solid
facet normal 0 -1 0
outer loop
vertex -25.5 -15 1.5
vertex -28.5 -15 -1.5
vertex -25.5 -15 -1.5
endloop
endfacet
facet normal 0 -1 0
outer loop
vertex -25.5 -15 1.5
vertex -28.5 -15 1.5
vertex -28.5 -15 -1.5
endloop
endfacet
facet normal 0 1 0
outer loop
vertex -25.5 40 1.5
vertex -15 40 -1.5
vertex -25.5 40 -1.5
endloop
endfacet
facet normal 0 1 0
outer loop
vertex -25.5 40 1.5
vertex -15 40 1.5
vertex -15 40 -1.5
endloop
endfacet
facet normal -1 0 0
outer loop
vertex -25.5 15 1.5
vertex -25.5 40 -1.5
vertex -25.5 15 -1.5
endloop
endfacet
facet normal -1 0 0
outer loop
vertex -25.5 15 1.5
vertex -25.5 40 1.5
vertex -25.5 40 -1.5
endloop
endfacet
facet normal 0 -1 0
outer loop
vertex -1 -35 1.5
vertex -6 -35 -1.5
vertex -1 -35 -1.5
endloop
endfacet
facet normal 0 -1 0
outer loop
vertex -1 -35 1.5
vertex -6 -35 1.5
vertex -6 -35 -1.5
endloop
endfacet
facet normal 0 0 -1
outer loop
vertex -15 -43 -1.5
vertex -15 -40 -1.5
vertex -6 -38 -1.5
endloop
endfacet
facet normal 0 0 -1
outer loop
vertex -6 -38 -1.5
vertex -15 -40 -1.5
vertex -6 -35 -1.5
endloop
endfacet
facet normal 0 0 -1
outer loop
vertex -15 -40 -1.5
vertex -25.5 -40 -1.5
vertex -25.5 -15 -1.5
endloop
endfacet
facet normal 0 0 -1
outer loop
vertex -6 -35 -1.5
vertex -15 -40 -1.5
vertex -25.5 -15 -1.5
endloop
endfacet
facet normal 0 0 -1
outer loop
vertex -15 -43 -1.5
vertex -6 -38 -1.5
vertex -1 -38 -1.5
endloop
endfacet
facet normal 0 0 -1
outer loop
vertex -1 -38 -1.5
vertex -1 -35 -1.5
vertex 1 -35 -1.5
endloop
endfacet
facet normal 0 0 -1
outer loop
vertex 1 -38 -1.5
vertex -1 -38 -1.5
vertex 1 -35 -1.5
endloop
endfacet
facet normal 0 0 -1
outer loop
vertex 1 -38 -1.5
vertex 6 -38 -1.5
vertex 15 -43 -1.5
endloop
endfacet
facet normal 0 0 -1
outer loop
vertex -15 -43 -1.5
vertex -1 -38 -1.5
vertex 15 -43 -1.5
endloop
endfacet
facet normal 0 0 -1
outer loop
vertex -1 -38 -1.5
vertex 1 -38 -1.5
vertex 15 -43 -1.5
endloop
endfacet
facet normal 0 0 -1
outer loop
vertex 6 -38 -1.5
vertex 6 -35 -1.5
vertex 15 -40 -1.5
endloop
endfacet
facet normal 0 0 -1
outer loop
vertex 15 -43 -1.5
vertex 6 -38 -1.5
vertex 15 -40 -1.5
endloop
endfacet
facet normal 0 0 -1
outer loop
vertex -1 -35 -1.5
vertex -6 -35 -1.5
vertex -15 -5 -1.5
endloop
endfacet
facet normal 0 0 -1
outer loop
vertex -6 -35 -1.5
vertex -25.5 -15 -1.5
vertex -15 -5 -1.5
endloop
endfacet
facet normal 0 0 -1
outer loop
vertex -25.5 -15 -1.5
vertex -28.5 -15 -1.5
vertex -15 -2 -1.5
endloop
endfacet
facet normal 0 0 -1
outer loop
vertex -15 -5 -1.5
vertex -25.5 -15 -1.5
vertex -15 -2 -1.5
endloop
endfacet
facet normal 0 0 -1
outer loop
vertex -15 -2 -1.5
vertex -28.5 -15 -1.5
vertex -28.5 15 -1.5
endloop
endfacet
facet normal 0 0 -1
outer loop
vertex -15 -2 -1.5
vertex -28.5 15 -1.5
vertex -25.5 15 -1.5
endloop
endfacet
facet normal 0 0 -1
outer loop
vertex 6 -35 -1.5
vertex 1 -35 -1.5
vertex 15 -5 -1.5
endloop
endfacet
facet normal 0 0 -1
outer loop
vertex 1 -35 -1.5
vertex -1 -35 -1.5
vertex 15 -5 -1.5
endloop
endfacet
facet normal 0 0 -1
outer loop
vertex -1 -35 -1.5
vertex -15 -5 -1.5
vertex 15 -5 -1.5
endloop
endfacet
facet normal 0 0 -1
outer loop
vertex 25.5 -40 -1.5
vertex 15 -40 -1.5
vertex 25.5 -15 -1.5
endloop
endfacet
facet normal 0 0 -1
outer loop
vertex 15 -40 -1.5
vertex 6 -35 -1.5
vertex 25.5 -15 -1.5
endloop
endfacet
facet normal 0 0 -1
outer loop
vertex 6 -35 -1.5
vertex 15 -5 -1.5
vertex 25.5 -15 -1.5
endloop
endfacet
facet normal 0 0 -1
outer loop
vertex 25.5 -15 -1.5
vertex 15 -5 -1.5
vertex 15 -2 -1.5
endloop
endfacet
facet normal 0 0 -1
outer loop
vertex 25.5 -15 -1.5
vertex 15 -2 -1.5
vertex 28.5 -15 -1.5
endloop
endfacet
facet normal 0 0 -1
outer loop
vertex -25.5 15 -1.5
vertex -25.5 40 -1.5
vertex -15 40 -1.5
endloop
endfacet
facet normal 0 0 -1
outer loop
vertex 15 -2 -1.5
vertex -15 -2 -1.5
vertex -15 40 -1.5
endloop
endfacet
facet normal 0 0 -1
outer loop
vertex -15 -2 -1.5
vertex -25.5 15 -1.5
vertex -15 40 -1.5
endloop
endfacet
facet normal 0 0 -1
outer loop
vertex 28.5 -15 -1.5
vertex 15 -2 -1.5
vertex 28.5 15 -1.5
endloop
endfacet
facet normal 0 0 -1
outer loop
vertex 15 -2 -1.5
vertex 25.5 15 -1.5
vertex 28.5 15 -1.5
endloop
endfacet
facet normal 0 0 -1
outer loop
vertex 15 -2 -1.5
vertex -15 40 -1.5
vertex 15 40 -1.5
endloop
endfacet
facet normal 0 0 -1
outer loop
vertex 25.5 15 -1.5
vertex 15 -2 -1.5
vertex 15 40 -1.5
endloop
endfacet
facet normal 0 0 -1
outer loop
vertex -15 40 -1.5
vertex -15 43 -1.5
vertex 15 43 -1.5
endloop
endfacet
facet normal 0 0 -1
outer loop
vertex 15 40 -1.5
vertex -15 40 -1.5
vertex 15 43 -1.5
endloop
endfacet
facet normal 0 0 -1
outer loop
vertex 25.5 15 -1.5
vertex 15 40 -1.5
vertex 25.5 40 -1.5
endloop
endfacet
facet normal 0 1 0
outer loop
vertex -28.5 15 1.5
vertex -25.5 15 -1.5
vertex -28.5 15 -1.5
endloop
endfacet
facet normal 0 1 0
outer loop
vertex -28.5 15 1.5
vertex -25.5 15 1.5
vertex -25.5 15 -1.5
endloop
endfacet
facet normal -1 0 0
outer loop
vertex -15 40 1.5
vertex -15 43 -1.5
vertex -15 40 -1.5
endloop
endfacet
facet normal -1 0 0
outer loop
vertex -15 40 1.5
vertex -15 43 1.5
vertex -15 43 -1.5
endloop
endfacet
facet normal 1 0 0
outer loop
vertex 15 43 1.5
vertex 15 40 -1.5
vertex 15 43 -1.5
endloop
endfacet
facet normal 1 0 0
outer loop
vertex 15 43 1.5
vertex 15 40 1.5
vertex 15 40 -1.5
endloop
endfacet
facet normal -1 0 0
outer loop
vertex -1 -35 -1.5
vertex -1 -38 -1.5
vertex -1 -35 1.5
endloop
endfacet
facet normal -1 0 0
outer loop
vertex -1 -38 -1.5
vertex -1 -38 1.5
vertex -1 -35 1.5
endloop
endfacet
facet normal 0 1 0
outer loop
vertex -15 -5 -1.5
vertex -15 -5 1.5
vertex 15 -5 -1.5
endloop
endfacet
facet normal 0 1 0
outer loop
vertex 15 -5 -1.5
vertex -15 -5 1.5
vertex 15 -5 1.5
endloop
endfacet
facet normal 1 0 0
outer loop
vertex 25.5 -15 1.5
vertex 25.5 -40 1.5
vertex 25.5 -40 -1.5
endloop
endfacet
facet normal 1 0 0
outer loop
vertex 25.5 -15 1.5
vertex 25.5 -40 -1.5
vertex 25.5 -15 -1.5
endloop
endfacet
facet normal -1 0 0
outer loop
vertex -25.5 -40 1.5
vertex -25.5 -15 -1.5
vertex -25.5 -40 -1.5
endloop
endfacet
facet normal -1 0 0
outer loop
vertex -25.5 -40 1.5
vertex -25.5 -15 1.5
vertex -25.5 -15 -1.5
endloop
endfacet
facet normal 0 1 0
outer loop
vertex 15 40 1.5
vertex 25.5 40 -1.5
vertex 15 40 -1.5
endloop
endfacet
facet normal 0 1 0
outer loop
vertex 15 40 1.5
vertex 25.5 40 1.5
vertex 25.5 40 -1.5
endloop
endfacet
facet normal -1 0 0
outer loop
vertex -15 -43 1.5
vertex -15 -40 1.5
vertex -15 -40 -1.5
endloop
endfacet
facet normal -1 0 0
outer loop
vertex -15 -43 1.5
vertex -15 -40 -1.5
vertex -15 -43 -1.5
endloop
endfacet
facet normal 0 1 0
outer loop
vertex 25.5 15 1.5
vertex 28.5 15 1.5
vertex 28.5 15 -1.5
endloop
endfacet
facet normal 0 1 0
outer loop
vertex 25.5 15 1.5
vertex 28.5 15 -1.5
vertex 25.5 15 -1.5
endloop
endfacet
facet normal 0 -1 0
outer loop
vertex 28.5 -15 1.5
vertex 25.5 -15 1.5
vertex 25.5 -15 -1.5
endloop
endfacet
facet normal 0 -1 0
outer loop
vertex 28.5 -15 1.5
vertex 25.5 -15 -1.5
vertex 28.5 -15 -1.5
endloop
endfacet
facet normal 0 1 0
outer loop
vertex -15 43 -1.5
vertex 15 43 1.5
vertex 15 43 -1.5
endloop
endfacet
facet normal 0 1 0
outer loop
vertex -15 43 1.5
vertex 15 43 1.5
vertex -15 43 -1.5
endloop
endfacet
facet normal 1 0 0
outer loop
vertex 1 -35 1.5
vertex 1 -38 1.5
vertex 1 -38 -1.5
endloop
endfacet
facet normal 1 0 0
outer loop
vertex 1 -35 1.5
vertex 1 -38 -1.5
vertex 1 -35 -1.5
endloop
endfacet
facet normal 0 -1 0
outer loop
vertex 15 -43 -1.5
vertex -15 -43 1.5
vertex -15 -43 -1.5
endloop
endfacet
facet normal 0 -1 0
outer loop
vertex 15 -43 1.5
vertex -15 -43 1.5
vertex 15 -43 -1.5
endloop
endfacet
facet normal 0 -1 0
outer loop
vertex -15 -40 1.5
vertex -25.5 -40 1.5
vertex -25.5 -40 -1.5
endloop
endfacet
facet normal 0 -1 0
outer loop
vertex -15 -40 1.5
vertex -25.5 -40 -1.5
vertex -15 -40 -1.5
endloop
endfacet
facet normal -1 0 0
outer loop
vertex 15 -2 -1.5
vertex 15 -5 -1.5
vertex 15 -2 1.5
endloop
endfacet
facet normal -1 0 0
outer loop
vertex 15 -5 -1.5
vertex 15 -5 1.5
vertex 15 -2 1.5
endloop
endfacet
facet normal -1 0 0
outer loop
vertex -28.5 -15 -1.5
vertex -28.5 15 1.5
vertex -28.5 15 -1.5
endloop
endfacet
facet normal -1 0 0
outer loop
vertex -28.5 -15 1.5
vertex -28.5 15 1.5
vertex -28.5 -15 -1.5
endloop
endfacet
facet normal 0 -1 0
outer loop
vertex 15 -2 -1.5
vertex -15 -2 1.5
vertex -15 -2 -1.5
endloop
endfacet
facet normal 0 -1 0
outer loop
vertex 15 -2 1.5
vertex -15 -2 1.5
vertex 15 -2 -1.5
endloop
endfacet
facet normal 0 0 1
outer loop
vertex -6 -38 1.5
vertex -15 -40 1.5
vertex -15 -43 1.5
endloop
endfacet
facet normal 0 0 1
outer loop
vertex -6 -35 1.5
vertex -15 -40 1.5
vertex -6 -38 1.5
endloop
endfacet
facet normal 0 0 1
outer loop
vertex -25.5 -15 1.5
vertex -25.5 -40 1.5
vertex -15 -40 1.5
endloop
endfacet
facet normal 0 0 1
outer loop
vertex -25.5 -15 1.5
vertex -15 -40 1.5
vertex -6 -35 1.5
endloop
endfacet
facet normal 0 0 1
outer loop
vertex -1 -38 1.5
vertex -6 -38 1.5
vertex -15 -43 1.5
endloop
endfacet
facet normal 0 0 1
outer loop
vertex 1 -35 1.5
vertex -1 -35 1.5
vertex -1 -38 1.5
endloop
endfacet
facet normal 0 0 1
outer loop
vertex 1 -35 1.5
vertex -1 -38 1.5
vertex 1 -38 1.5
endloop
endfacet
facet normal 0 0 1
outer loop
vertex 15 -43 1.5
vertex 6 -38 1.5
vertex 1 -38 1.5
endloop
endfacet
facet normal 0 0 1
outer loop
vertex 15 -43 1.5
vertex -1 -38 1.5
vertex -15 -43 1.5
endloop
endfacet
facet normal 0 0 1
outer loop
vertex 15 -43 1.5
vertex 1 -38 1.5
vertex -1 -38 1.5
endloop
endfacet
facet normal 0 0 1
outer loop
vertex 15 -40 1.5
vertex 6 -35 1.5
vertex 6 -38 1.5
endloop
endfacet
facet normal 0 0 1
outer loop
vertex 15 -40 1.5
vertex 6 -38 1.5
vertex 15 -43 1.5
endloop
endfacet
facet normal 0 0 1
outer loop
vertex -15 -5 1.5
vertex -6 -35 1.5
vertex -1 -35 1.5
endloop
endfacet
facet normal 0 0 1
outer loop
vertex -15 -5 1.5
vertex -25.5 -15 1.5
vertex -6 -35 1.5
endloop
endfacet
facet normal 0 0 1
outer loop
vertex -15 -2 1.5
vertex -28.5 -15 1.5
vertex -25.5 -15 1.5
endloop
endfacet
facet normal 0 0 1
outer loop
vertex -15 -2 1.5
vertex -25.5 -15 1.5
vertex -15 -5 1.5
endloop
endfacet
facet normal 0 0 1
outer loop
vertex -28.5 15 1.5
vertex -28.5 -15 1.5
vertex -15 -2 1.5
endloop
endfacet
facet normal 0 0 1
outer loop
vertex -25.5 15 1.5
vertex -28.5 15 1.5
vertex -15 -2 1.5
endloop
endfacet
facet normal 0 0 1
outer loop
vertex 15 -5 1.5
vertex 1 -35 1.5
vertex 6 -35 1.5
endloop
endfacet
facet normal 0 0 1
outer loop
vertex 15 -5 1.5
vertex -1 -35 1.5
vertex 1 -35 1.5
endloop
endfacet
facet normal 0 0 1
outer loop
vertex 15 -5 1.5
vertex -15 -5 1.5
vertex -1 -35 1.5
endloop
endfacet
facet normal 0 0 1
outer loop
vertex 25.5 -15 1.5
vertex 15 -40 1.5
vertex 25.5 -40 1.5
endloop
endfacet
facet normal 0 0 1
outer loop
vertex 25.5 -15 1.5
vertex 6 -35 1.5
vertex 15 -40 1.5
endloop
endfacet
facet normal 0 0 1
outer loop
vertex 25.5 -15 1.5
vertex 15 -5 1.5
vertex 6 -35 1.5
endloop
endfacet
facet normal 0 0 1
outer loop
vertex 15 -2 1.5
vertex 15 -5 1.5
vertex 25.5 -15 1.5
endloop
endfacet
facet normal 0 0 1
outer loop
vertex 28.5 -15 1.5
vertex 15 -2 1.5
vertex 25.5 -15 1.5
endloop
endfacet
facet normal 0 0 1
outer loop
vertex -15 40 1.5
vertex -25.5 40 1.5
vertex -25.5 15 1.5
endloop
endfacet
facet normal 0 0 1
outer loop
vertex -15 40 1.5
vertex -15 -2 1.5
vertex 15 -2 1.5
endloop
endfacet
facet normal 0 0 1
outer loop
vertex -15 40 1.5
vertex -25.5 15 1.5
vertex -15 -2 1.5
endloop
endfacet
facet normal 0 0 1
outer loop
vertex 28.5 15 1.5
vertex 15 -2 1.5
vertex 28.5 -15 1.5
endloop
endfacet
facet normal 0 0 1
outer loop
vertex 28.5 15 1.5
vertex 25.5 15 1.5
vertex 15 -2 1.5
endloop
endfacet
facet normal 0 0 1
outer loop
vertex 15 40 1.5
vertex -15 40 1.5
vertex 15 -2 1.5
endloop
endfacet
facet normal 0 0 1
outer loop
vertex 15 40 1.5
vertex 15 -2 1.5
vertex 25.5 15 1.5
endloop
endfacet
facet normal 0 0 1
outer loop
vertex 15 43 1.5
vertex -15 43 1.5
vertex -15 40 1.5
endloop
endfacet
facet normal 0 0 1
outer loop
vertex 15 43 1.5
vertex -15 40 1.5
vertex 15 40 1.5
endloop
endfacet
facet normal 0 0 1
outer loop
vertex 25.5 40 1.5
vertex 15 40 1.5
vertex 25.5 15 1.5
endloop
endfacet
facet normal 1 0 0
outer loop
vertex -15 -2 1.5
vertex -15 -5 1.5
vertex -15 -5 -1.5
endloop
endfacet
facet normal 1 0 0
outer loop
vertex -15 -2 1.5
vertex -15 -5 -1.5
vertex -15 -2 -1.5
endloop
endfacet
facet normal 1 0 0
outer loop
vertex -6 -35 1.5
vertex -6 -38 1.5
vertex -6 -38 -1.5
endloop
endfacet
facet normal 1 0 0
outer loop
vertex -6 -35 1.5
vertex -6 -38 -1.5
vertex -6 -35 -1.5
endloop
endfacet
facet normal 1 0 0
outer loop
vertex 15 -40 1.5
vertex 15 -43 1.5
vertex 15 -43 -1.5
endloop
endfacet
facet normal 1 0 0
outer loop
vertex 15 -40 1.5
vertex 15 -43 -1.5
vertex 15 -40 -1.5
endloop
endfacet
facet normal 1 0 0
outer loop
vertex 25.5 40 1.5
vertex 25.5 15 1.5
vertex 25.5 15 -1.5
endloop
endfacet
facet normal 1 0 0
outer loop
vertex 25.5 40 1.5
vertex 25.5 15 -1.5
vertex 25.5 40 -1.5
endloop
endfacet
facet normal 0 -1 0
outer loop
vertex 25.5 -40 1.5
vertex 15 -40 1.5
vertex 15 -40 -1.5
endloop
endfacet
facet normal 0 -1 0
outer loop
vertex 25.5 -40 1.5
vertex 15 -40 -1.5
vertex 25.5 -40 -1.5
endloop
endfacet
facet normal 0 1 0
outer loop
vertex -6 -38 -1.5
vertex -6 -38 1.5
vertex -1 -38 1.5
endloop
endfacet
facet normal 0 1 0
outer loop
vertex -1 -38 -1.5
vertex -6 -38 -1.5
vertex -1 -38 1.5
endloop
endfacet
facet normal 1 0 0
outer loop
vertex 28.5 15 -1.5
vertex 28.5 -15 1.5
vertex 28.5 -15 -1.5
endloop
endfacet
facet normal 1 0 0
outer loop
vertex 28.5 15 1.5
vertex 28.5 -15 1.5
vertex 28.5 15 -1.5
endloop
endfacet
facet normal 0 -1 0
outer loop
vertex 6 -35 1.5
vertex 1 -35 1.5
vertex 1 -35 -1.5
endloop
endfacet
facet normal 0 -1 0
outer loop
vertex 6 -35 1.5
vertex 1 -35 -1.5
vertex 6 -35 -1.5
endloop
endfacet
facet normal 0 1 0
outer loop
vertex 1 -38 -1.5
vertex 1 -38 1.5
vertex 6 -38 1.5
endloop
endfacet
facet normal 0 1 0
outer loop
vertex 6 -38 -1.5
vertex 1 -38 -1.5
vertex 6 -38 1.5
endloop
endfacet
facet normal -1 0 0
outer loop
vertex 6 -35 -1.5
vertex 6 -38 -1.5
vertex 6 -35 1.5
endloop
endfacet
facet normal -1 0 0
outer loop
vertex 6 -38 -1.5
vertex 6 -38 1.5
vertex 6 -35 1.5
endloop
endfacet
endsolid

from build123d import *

# Parameters (mm, degrees)
SKETCH1_W           = 30
SKETCH1_H           = 3
SKETCH1_W_2         = 5
BOSS_EXTRUDE1_DEPTH = 1.5


with BuildPart() as part:
    # Sketch1 → Boss-Extrude1 (new body, symmetric)
    with BuildSketch(Plane.XY):
        Polygon((-25.5, -15), (-25.5, -40), (-15, -40), (-15, -43), (15, -43), (15, -40), (25.5, -40), (25.5, -15), (28.5, -15), (28.5, 15), (25.5, 15), (25.5, 40), (15, 40), (15, 43), (-15, 43), (-15, 40), (-25.5, 40), (-25.5, 15), (-28.5, 15), (-28.5, -15), align=None)
        with Locations((0, -3.5)):
            Rectangle(SKETCH1_W, SKETCH1_H, mode=Mode.SUBTRACT)
        with Locations((3.5, -36.5)):
            Rectangle(SKETCH1_W_2, SKETCH1_H, mode=Mode.SUBTRACT)
        with Locations((-3.5, -36.5)):
            Rectangle(SKETCH1_W_2, SKETCH1_H, mode=Mode.SUBTRACT)
    extrude(amount=BOSS_EXTRUDE1_DEPTH, both=True)


solid = part.part
